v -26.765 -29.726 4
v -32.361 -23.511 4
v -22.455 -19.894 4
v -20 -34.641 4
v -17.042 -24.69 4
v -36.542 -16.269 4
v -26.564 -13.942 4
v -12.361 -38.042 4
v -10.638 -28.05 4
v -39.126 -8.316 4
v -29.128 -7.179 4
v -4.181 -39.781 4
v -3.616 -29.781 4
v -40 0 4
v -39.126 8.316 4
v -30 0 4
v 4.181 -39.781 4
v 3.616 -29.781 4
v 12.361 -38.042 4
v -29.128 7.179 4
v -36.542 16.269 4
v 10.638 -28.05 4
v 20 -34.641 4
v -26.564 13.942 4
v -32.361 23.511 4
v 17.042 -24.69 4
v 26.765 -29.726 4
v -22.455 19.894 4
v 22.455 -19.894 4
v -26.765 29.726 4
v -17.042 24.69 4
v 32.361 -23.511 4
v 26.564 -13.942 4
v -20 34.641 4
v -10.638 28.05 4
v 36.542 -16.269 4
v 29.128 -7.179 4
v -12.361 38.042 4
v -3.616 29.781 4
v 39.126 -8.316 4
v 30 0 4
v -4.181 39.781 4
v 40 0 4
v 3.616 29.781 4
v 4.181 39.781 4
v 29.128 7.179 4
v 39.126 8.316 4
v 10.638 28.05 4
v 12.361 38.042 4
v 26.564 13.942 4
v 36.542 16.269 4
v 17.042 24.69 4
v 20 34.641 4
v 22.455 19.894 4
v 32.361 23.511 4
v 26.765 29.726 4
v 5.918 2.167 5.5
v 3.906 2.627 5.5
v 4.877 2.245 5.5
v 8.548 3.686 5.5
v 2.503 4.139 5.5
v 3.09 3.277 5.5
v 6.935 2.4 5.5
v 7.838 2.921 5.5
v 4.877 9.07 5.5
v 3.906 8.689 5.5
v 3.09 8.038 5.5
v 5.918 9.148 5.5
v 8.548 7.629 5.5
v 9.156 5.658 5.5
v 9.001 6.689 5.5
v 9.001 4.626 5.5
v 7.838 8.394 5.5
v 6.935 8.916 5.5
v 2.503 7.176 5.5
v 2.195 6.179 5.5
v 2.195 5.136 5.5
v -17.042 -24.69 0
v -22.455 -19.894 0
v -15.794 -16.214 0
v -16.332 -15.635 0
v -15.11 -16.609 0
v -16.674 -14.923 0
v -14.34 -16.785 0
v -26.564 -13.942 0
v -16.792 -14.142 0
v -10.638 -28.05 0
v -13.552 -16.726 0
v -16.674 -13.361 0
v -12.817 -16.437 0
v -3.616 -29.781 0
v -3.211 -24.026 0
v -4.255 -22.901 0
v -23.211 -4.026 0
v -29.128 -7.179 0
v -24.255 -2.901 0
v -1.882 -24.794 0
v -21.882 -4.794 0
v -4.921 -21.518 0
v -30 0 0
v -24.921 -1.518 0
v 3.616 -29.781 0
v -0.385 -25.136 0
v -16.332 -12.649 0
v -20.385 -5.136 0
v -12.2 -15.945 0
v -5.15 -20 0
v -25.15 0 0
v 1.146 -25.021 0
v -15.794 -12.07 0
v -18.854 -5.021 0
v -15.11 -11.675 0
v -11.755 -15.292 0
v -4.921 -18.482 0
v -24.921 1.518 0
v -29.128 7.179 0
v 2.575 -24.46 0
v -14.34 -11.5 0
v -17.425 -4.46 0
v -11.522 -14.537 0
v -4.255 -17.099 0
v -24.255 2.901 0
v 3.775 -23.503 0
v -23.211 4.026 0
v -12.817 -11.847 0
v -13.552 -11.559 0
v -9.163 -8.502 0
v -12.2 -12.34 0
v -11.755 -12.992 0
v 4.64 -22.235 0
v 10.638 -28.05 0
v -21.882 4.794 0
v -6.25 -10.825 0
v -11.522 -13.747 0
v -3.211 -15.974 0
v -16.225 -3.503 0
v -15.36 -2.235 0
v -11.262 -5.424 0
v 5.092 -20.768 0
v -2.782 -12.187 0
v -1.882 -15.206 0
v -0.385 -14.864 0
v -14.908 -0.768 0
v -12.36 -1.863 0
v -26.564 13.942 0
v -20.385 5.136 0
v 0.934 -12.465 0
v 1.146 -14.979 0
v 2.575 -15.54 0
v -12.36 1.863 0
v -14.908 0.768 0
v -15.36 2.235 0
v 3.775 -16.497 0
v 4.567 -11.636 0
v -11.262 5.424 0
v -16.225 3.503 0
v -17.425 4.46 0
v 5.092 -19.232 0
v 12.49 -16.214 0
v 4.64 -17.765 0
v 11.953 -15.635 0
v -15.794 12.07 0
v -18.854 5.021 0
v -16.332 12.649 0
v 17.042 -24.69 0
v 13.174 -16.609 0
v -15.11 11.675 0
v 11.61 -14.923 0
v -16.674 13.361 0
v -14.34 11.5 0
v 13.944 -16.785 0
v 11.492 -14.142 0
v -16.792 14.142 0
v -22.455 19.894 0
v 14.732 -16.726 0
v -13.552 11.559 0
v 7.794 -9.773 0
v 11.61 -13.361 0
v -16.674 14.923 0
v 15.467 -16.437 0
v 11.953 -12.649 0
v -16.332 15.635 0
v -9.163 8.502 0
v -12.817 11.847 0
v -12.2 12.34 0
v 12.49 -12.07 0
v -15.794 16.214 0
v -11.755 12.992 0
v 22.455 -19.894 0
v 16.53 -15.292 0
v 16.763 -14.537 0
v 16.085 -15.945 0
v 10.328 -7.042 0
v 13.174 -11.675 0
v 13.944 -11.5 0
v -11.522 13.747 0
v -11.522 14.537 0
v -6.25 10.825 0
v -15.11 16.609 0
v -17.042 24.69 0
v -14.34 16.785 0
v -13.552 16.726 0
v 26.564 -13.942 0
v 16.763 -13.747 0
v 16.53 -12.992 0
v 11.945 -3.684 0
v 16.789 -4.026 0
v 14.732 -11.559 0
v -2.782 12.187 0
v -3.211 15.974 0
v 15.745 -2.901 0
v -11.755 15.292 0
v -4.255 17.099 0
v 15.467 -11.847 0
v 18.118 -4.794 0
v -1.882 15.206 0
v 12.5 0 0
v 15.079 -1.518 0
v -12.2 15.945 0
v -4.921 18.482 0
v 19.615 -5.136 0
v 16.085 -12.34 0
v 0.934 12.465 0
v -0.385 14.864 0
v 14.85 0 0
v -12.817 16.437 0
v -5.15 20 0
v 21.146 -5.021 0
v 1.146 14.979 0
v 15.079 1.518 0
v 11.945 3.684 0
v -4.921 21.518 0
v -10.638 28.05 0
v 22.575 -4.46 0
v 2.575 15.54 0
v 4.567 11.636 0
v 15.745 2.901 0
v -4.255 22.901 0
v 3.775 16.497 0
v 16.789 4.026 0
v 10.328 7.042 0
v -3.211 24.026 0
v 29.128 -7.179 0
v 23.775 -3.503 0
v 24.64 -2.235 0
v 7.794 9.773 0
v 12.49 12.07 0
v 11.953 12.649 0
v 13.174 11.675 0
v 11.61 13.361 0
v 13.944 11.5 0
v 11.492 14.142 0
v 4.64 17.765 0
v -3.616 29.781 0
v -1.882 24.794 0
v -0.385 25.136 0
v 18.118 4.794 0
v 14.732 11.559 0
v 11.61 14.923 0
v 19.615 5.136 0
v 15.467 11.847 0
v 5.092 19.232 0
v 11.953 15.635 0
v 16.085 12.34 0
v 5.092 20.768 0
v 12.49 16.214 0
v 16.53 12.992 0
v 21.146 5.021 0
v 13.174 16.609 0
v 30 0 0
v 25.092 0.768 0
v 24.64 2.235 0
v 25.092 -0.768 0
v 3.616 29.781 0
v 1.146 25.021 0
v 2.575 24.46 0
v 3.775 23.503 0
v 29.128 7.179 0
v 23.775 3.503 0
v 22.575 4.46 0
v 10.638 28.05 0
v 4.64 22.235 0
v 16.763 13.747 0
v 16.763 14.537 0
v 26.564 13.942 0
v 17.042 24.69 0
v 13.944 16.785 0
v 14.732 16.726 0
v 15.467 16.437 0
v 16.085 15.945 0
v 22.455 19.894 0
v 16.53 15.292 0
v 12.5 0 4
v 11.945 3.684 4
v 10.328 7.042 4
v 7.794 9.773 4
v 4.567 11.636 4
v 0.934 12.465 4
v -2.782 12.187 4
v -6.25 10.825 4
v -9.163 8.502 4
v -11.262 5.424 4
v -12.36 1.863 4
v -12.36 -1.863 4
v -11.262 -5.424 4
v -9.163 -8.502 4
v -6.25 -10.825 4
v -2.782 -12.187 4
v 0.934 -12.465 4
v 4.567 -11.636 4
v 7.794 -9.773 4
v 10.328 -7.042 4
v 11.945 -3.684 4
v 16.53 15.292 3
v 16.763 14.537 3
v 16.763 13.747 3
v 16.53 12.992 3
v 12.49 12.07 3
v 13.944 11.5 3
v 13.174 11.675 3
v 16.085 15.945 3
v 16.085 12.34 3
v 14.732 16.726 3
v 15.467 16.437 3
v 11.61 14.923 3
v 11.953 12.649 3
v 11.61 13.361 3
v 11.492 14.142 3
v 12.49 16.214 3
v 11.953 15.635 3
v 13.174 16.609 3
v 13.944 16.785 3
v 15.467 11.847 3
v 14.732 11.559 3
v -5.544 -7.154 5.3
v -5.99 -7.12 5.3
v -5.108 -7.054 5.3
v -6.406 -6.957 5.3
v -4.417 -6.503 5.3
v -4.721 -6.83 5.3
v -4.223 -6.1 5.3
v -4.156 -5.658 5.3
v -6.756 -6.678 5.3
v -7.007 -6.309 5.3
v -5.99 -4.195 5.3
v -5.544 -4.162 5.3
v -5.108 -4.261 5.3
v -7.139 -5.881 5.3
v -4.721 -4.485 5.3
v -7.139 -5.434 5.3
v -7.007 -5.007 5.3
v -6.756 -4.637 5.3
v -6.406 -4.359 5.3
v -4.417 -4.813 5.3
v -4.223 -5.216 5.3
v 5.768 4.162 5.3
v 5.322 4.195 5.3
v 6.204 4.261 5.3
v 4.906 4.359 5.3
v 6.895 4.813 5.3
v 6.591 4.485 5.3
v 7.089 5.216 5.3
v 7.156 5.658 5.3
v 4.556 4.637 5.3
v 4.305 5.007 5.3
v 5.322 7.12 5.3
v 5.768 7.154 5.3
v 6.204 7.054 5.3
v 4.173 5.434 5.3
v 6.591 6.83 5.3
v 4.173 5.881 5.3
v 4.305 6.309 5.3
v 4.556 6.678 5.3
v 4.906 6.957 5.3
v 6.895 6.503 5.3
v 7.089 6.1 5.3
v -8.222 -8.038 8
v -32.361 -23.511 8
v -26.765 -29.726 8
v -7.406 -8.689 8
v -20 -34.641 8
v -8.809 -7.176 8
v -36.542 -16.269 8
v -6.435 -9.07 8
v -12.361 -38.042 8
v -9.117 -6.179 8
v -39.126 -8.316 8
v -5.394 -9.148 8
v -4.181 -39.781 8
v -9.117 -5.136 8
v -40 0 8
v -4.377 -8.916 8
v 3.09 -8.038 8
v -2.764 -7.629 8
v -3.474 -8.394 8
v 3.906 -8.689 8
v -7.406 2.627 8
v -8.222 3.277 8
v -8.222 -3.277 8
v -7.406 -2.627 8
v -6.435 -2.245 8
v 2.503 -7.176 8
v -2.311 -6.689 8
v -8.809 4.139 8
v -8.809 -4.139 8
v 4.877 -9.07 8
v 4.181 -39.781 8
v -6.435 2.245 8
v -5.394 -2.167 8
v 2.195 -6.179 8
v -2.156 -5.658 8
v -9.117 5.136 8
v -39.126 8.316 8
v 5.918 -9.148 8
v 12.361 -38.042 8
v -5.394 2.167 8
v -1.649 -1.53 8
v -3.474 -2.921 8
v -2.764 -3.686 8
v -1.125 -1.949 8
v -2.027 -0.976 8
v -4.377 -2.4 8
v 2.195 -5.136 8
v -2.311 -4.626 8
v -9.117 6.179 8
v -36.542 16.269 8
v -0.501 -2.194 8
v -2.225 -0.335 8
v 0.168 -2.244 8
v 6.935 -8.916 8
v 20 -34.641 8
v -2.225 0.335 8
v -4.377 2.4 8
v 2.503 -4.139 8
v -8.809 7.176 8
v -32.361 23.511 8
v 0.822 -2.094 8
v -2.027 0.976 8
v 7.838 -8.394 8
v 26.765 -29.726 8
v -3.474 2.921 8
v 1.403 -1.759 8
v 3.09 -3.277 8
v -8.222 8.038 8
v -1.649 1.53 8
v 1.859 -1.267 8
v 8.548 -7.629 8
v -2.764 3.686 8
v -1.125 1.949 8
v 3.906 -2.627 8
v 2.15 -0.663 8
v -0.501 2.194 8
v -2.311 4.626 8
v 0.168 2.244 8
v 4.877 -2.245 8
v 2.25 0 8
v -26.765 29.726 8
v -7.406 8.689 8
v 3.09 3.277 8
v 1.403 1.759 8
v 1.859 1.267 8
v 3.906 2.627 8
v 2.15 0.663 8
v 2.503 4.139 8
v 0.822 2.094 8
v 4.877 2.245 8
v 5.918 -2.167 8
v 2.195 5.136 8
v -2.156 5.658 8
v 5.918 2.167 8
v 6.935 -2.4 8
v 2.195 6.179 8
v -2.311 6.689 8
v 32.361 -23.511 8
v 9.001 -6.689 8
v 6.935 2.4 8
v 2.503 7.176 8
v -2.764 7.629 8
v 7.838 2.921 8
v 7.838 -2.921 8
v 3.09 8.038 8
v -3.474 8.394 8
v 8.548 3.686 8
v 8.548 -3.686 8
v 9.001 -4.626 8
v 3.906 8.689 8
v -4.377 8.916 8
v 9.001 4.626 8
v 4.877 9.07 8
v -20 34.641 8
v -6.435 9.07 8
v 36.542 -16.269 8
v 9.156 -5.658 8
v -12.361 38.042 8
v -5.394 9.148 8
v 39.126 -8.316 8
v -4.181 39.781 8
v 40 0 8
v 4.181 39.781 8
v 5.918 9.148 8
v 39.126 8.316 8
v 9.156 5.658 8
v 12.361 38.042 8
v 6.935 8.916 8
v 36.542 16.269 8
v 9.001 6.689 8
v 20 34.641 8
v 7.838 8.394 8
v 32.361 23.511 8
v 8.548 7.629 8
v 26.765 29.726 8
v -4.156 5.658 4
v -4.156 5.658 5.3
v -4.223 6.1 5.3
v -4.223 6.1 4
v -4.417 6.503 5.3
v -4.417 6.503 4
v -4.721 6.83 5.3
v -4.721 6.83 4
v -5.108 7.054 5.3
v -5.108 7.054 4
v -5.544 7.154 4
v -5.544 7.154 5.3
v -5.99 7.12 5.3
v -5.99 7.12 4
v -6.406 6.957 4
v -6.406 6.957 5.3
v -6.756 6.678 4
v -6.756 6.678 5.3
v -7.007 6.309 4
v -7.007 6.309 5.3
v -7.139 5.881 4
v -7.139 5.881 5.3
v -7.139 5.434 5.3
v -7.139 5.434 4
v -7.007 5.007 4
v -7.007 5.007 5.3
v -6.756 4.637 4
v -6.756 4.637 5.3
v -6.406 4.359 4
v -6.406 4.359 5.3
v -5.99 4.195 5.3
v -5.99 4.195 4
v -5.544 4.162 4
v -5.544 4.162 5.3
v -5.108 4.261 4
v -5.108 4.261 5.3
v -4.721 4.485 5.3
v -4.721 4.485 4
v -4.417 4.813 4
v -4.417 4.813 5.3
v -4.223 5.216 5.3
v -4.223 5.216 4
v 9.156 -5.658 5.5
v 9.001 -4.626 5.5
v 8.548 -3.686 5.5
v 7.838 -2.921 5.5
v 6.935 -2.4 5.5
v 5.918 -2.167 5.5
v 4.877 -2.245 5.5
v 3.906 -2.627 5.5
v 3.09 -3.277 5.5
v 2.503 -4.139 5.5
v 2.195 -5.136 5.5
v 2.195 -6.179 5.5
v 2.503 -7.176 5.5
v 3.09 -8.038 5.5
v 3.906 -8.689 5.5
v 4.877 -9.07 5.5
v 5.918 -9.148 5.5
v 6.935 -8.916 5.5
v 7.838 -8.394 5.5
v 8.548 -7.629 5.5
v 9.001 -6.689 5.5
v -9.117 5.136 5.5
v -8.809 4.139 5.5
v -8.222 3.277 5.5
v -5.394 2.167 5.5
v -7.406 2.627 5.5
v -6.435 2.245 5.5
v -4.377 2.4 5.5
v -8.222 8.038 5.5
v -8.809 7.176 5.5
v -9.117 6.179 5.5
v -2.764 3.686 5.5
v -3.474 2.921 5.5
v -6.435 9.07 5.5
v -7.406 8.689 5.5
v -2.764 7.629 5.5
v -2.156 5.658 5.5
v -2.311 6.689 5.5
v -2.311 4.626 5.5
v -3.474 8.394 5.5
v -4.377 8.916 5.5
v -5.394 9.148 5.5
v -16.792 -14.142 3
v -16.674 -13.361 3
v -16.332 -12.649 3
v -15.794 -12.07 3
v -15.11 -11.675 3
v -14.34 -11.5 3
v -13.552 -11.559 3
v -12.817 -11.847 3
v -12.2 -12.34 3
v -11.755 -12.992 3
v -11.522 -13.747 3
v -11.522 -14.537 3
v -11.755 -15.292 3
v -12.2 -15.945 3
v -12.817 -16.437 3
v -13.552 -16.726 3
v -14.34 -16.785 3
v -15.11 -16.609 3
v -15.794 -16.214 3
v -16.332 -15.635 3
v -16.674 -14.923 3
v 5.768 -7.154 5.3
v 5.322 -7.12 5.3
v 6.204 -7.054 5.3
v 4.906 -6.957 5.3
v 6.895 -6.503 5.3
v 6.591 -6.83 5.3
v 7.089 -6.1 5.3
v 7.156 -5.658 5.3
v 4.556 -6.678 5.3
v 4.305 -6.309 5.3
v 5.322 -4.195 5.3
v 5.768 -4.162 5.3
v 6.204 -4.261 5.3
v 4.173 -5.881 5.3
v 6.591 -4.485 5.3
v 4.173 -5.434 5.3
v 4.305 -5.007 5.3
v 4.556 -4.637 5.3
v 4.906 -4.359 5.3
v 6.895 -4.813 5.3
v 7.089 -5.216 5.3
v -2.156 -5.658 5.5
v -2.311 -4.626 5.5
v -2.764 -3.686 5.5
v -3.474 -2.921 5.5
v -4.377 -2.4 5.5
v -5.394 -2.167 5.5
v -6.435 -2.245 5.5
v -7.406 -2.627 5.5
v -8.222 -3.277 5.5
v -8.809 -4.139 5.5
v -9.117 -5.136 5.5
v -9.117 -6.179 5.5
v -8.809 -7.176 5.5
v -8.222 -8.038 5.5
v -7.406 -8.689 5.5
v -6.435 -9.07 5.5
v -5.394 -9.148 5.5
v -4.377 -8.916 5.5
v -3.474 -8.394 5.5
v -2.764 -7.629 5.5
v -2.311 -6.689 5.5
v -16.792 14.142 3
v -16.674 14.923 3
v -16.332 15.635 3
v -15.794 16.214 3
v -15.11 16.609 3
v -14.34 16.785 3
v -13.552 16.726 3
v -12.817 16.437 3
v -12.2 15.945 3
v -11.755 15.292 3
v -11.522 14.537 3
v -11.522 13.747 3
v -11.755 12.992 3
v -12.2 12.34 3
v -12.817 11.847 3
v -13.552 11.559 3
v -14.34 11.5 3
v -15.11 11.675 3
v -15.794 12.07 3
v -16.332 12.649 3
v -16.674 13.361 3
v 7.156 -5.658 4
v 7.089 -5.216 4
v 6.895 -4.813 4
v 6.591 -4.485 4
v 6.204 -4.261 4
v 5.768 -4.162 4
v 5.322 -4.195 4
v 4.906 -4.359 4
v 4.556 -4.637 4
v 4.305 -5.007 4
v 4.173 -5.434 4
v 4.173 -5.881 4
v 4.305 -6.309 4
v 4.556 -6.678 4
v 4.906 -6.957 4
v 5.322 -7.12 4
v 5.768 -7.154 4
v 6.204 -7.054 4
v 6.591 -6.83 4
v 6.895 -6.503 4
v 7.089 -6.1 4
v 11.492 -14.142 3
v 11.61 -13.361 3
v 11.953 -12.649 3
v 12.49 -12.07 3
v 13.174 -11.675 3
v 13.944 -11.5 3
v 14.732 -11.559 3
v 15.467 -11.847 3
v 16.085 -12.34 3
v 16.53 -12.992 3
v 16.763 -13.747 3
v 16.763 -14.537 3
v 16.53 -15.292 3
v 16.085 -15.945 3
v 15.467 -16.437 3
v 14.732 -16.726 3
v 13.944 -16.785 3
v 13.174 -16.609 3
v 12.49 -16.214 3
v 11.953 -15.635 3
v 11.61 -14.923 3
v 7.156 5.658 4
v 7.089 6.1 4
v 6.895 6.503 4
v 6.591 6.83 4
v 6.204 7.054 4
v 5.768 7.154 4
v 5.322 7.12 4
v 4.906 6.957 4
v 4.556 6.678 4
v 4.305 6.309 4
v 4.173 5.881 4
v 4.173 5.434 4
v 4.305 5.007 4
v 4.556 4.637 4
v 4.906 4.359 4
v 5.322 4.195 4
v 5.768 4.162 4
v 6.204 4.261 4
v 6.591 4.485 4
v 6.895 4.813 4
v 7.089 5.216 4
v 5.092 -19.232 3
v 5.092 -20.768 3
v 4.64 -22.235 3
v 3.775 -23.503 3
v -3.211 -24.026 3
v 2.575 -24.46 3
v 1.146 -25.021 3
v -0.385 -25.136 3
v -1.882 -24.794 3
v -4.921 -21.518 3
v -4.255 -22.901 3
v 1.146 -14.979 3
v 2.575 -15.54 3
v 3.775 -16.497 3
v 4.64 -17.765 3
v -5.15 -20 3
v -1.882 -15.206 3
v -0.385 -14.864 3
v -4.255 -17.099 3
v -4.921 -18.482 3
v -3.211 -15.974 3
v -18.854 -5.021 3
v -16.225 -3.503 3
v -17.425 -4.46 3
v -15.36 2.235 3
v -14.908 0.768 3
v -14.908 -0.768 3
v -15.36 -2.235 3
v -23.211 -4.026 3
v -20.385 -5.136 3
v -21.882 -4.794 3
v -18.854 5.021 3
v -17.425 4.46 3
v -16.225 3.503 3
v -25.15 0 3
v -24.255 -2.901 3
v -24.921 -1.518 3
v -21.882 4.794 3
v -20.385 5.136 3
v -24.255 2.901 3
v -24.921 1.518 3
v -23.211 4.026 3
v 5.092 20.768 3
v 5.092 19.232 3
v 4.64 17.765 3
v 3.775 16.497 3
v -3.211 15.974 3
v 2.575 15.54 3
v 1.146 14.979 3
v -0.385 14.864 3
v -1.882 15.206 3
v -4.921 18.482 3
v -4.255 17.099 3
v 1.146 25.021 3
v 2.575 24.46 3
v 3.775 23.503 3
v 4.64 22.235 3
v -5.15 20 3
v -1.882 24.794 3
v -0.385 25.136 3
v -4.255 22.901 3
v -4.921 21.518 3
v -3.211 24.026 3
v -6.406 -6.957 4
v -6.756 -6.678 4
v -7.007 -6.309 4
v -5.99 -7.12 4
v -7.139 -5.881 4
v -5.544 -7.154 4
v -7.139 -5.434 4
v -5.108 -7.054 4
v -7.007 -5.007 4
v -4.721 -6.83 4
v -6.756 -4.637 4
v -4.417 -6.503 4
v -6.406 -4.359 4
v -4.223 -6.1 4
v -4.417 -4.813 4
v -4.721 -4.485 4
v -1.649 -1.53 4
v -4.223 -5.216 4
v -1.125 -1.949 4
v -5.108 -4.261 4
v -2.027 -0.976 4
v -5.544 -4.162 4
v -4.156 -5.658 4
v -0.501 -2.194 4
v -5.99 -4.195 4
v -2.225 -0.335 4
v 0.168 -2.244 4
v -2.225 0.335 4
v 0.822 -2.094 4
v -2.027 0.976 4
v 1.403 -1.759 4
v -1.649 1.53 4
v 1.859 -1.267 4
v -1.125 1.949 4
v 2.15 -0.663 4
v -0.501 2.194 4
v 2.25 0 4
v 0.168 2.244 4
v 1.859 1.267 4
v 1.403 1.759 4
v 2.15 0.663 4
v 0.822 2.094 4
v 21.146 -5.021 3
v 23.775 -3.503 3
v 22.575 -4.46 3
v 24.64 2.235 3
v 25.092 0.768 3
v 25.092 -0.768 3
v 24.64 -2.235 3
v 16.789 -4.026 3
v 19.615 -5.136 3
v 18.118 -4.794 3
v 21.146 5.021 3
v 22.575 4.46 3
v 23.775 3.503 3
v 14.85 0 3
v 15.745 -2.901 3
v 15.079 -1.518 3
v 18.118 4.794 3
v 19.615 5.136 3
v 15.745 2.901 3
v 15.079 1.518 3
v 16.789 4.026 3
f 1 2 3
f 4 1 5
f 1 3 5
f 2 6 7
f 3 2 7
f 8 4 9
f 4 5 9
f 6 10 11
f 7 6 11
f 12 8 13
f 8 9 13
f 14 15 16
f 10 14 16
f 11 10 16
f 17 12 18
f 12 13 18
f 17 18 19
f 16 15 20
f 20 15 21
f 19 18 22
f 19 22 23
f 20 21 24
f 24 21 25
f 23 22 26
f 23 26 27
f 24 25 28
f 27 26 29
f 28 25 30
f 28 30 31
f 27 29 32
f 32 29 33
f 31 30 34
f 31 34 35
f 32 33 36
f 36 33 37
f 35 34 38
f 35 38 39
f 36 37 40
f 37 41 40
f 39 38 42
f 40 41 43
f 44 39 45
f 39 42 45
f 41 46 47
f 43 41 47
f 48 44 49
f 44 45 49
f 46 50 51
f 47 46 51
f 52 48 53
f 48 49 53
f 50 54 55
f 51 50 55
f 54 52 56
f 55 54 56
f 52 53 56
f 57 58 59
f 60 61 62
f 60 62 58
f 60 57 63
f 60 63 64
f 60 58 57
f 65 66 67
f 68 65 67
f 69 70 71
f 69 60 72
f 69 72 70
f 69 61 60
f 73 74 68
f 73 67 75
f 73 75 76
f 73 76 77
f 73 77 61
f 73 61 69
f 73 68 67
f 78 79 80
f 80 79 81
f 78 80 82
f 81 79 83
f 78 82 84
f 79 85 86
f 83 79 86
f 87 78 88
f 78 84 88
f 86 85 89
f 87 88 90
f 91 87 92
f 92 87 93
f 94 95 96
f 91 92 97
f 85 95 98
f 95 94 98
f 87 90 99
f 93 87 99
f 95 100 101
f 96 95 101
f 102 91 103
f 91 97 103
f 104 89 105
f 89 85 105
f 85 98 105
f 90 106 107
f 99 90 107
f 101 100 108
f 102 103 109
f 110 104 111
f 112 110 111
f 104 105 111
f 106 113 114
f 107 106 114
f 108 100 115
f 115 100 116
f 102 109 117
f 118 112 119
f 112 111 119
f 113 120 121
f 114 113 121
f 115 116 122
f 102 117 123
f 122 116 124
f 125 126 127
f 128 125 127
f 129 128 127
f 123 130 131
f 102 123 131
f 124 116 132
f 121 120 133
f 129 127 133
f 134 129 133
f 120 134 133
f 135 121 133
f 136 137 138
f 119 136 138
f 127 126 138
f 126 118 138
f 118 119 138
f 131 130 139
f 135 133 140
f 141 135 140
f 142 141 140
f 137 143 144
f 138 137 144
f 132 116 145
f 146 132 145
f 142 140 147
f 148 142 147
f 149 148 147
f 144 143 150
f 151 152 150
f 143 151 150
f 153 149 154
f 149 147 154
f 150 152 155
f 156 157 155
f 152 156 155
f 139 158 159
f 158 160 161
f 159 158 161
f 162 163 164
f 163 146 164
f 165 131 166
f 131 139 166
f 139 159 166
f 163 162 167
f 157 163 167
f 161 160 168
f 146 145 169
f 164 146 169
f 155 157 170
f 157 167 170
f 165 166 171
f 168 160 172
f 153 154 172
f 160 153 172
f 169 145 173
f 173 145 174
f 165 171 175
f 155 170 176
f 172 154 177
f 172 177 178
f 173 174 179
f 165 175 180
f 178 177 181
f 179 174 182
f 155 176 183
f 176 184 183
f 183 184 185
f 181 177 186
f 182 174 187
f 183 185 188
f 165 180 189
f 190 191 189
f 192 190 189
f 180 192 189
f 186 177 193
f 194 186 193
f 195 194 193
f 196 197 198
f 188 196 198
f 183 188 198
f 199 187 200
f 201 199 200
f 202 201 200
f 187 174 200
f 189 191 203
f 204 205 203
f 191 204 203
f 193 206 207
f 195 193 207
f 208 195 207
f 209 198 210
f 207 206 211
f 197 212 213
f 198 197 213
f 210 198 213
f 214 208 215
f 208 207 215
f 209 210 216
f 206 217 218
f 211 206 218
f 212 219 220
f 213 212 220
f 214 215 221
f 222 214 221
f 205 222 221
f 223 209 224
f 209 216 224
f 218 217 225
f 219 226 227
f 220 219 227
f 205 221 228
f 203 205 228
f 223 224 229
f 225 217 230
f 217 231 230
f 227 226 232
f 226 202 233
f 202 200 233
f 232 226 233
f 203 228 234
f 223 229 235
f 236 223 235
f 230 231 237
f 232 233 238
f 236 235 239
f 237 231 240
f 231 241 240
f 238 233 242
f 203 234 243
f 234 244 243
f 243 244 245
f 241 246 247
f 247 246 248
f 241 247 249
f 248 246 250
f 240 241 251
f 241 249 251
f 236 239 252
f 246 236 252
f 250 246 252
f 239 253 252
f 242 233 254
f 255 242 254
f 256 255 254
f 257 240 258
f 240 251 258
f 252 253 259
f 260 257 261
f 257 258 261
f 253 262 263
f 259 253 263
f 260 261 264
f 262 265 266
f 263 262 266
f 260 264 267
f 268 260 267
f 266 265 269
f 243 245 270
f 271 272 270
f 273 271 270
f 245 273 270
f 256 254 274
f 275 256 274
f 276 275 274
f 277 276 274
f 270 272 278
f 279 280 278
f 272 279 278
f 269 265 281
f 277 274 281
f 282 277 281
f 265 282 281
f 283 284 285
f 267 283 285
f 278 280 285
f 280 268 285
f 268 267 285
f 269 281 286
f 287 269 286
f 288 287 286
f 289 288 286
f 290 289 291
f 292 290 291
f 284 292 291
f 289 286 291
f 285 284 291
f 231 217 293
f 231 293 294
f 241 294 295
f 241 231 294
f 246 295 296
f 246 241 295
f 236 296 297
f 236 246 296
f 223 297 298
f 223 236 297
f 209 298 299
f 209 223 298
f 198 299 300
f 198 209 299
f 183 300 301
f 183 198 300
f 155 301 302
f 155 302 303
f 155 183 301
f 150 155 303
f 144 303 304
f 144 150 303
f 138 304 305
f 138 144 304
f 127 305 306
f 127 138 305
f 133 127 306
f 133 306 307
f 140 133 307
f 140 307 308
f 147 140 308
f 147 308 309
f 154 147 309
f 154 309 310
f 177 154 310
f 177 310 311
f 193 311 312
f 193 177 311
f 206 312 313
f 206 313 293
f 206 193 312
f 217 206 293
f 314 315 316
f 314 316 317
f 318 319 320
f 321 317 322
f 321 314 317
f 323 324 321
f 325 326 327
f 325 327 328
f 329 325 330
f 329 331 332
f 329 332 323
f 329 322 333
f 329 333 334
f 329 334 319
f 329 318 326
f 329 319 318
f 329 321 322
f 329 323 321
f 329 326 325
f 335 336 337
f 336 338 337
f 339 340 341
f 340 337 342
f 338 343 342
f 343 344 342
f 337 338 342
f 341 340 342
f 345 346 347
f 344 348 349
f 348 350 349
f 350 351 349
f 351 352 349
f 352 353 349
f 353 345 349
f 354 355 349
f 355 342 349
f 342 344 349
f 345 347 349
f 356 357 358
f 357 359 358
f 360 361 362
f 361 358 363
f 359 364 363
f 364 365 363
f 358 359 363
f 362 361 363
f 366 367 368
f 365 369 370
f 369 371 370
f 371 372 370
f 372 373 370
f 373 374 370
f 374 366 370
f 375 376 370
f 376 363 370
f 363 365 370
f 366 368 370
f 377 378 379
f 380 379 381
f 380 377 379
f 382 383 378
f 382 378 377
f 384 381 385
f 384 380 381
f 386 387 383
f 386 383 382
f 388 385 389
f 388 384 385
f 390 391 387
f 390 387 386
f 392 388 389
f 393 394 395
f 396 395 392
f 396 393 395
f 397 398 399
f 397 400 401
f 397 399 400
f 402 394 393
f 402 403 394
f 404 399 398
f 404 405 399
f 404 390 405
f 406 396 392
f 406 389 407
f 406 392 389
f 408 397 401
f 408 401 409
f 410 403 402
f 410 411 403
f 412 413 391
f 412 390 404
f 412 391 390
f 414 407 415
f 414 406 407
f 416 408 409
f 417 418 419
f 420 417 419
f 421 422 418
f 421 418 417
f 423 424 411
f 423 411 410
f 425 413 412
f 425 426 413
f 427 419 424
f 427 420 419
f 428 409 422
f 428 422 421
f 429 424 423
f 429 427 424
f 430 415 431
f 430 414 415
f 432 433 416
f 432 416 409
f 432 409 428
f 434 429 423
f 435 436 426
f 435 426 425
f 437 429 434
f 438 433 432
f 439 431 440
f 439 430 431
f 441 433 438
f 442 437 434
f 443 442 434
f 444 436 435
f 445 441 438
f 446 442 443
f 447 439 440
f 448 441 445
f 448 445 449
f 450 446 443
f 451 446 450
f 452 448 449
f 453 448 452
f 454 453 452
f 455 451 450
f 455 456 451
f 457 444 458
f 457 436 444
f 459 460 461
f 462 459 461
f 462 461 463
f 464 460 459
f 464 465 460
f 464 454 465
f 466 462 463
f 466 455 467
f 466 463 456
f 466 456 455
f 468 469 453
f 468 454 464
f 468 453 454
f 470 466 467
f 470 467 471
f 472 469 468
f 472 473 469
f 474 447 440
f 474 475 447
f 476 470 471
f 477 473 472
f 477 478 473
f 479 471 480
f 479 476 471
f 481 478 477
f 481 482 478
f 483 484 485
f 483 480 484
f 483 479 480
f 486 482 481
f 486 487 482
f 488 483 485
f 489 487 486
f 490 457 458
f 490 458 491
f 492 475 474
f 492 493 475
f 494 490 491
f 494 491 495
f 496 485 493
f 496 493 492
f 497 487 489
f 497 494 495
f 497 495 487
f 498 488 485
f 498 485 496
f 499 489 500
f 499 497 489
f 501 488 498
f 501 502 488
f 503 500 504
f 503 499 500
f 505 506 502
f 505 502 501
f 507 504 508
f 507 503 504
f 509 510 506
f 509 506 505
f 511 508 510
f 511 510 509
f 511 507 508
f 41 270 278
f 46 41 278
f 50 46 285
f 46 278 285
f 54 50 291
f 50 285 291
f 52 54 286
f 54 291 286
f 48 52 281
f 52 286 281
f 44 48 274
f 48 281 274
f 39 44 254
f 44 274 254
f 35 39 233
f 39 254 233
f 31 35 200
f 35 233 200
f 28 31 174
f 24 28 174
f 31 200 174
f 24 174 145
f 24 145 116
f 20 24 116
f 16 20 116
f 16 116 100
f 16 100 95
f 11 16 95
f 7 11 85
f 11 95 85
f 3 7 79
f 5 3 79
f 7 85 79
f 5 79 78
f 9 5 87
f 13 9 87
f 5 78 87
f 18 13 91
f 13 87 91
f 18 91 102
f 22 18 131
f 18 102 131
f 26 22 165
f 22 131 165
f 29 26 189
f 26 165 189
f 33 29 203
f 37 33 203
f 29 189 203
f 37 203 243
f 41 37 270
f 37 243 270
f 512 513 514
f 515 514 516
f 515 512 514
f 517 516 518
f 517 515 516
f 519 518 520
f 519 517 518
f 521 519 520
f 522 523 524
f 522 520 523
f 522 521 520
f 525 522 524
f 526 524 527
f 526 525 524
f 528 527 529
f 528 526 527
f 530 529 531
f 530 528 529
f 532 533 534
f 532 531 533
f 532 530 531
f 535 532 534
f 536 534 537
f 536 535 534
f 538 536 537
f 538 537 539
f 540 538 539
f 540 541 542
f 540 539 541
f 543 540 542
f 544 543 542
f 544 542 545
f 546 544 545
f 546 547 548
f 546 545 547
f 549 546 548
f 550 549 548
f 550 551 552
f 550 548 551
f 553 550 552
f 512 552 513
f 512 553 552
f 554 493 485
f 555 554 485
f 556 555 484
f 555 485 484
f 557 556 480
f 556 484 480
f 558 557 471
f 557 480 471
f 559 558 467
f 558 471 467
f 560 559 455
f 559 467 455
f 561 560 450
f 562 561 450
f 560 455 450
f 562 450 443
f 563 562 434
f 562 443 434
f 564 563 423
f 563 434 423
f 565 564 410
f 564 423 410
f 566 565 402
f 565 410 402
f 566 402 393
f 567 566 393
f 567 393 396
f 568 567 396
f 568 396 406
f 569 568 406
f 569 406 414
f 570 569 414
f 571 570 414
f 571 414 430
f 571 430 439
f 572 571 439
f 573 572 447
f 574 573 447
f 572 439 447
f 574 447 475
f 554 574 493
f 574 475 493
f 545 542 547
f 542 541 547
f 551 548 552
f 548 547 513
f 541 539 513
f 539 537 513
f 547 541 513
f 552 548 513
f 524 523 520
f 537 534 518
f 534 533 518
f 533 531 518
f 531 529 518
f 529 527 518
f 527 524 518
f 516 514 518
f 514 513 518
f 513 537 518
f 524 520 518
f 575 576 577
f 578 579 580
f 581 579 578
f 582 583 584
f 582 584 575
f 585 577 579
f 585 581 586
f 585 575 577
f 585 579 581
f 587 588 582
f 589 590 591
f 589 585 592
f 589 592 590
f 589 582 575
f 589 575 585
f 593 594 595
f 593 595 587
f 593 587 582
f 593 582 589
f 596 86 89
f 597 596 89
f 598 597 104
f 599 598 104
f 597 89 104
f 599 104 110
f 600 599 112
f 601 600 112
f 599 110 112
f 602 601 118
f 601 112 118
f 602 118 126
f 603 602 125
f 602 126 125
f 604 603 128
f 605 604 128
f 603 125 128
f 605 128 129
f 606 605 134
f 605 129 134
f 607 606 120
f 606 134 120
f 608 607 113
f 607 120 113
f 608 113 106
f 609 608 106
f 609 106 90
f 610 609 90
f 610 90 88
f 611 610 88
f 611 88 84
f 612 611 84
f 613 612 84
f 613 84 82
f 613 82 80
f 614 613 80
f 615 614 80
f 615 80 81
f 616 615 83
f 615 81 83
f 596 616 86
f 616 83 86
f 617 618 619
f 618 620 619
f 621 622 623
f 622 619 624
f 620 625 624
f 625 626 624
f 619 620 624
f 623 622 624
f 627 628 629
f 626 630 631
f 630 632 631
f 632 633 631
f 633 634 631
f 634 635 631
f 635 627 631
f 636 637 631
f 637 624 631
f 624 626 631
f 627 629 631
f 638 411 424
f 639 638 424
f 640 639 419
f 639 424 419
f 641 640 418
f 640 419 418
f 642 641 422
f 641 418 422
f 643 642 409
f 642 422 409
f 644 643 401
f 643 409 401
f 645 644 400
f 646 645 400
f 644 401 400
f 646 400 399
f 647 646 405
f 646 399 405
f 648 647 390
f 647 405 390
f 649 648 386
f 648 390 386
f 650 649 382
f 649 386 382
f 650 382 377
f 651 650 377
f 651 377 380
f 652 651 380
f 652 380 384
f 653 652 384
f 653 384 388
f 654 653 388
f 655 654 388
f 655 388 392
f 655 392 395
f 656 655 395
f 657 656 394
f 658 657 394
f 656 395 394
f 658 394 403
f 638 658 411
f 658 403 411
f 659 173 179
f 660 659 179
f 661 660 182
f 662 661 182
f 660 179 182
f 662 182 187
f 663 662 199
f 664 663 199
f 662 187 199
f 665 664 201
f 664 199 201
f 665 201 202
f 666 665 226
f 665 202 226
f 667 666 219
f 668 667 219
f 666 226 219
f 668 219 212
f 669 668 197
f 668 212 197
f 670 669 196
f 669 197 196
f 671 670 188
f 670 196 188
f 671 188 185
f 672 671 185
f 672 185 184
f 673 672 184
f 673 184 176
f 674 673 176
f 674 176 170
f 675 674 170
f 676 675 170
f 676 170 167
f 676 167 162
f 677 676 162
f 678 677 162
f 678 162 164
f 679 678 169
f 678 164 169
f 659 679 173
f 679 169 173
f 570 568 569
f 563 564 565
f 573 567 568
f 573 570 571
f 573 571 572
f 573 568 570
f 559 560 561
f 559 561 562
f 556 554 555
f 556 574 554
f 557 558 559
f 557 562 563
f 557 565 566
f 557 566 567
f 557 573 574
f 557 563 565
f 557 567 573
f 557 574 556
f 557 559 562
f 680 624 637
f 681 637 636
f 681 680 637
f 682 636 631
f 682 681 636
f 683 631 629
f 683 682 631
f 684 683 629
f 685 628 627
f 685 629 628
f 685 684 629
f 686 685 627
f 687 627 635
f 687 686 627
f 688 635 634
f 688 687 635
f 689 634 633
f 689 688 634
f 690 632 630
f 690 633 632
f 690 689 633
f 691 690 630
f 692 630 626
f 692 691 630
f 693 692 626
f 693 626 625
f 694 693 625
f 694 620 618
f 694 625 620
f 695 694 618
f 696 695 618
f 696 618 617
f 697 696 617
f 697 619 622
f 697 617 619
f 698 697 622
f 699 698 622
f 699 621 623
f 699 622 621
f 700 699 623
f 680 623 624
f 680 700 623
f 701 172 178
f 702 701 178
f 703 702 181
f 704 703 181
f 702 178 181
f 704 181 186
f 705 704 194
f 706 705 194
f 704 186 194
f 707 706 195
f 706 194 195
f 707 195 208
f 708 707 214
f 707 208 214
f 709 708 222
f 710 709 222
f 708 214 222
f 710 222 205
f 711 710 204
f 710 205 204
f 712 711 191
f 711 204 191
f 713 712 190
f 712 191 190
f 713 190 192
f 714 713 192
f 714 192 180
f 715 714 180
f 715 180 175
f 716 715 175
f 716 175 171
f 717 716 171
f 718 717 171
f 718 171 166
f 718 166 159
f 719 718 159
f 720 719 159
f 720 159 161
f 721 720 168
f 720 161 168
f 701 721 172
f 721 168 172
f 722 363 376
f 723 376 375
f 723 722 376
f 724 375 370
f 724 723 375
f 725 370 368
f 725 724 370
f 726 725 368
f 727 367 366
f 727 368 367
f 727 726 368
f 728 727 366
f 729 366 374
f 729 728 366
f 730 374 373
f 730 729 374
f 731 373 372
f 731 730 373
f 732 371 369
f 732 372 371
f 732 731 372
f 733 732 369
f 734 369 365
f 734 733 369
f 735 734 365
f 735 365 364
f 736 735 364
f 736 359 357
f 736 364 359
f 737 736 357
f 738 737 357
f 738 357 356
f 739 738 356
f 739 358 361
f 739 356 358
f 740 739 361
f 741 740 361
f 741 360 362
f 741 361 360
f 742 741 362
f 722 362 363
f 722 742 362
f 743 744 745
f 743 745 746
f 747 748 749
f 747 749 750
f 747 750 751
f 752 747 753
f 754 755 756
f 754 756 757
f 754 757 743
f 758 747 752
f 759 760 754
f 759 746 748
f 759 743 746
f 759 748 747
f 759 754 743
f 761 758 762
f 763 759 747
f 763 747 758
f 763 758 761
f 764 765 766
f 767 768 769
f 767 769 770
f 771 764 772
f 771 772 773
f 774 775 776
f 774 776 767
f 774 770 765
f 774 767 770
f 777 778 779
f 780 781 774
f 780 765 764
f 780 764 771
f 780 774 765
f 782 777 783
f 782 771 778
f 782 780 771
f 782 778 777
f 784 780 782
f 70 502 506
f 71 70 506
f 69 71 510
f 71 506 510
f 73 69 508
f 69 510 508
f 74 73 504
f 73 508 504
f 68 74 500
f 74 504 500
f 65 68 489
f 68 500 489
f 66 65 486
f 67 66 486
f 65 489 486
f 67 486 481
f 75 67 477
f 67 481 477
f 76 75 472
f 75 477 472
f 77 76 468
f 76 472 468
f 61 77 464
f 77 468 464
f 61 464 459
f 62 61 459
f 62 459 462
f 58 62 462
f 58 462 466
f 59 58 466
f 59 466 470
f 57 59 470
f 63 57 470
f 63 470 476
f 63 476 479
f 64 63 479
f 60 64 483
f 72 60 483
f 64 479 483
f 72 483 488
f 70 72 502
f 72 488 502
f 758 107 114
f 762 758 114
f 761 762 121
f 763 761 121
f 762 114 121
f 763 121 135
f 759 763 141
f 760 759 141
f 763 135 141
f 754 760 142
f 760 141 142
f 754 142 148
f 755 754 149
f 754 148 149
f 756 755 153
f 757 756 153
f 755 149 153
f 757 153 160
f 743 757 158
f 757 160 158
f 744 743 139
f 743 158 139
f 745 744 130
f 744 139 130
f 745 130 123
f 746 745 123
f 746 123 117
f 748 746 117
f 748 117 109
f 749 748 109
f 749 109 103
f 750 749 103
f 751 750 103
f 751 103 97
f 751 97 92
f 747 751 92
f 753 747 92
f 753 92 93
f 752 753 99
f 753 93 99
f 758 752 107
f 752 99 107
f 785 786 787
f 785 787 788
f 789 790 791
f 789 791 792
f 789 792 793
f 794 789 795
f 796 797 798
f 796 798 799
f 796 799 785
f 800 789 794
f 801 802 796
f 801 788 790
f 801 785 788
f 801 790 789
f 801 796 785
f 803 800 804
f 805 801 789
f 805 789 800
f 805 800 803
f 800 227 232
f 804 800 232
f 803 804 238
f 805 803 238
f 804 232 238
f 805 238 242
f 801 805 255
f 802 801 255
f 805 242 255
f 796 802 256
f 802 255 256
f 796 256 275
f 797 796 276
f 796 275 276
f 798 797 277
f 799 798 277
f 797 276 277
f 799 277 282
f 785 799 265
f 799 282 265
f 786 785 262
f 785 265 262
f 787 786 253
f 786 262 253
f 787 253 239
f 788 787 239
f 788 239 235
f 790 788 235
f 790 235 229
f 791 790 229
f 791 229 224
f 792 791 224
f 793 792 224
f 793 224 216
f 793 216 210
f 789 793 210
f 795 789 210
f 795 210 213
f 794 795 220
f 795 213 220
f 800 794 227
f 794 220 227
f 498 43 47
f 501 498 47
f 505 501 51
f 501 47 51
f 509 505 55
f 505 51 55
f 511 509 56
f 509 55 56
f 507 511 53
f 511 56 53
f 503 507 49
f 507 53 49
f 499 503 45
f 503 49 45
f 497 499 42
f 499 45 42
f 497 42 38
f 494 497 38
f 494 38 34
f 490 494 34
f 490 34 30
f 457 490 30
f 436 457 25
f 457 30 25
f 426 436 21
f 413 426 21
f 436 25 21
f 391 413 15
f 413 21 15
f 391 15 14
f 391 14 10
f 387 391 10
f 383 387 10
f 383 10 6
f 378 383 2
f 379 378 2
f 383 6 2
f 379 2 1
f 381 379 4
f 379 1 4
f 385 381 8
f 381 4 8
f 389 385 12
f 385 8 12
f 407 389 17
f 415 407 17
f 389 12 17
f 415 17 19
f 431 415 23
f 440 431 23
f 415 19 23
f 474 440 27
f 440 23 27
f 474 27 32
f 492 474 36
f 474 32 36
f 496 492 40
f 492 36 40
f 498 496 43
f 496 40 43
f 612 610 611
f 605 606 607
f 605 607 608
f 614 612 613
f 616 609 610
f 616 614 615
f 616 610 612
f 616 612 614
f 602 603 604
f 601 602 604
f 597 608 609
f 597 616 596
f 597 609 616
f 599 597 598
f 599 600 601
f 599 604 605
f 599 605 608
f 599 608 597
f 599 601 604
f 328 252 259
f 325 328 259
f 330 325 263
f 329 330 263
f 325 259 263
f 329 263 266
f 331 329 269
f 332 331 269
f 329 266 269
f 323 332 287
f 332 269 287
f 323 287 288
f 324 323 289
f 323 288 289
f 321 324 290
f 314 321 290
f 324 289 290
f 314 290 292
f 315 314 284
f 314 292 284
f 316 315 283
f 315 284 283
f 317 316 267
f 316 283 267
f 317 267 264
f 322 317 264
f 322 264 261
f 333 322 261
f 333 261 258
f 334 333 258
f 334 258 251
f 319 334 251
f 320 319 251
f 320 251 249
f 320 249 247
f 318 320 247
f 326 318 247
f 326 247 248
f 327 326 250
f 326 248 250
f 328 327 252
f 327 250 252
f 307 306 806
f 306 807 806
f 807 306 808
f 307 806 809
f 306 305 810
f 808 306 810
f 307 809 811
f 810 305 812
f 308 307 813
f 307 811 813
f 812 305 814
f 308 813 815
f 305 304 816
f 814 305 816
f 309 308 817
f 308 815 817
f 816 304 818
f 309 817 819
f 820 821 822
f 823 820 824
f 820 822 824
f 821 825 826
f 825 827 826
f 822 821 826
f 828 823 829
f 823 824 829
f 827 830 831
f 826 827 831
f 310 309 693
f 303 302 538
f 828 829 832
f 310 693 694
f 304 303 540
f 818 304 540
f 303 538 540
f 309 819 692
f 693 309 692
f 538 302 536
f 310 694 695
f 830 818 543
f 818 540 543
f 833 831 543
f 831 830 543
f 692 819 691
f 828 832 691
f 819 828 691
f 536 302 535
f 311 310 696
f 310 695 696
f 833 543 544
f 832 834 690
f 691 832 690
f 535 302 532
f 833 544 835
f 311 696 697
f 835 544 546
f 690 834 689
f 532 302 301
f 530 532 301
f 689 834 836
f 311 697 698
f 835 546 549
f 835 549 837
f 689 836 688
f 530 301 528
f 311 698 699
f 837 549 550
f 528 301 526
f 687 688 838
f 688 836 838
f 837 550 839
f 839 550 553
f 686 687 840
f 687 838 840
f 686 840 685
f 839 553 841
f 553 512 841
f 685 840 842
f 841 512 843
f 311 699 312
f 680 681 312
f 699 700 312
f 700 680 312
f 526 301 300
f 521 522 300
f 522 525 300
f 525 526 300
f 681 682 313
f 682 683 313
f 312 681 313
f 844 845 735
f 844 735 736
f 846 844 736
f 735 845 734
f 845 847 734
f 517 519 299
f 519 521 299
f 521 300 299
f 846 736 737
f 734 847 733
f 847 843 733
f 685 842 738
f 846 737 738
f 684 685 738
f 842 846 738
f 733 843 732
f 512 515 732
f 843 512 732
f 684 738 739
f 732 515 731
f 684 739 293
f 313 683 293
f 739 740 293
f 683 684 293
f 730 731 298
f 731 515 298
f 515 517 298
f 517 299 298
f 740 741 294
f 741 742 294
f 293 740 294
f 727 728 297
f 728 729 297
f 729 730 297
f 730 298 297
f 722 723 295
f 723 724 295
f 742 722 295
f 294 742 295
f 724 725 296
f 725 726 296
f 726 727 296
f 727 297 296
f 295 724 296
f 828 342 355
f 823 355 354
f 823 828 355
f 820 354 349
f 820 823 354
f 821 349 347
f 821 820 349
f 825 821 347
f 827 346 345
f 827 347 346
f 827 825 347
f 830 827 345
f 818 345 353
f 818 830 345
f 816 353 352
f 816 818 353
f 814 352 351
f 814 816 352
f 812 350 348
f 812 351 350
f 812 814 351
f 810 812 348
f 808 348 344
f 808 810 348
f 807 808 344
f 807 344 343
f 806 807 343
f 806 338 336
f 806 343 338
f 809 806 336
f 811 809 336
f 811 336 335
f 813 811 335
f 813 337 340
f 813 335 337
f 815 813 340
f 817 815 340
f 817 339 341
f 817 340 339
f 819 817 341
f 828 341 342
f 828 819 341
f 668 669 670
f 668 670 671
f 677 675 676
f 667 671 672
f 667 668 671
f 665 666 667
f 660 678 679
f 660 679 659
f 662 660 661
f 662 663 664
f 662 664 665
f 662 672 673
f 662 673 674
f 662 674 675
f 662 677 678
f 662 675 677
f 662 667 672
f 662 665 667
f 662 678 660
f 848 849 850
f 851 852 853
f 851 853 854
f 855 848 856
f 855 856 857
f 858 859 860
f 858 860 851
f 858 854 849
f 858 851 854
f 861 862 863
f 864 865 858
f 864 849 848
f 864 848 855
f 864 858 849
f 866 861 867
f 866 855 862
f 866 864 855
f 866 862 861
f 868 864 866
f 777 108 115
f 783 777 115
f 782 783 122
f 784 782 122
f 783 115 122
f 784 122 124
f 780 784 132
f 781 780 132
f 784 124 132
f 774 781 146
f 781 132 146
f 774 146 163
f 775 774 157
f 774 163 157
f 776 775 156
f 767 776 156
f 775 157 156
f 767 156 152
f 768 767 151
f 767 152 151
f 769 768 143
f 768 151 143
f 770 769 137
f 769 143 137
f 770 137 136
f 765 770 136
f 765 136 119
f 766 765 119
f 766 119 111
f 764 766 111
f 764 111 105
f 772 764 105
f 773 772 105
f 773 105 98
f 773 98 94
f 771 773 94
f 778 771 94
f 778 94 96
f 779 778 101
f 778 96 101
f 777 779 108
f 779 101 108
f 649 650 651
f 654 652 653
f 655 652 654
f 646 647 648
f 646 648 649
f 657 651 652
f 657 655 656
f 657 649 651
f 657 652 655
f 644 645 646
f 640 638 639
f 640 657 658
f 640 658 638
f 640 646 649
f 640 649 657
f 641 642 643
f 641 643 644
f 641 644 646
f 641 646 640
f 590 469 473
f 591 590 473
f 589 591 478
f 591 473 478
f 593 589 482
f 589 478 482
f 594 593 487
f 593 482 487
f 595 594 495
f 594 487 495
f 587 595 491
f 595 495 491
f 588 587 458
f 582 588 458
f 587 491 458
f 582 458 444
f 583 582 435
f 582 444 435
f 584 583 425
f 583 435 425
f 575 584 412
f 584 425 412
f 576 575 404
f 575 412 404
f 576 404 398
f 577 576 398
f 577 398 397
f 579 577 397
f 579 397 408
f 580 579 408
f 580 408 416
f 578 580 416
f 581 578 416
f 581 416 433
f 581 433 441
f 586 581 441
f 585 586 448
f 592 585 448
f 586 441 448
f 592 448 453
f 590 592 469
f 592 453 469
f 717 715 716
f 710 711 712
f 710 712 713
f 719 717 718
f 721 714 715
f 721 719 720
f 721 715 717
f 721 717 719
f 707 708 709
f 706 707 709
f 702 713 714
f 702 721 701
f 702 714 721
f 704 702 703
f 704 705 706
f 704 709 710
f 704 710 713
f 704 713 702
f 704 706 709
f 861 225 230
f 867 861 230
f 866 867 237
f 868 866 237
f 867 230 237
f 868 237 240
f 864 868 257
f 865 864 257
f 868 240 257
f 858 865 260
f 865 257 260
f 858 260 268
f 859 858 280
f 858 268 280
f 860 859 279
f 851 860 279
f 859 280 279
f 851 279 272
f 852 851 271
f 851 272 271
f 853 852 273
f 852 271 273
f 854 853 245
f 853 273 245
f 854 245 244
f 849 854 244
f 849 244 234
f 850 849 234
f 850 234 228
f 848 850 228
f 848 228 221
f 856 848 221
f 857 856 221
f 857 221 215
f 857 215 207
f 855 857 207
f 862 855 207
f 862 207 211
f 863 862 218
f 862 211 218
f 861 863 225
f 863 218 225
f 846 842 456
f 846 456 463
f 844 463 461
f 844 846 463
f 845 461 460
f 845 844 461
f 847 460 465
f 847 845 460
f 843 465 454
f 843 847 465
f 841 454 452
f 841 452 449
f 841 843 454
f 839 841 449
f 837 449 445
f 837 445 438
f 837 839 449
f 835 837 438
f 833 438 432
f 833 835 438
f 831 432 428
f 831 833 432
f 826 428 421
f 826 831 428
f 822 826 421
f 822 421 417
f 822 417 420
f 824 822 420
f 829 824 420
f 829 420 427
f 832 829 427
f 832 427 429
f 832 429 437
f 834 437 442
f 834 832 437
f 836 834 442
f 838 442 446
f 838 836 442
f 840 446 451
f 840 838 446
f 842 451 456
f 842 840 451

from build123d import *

# Parameters (mm, degrees)
SKETCH1_R           = 30
SKETCH1_R_2         = 12.5
BOSS_EXTRUDE1_DEPTH = 4
SKETCH2_R           = 40
SKETCH2_R_2         = 2.25
SKETCH2_R_3         = 1.5
BOSS_EXTRUDE2_DEPTH = 4
SKETCH3_R           = 3.5
CUT_EXTRUDE1_DEPTH  = 2.5
SKETCH4_R           = 5.15
SKETCH4_R_2         = 2.65
CUT_EXTRUDE2_DEPTH  = 3
SKETCH5_R           = 3.5
BOSS_EXTRUDE3_DEPTH = 0.2


with BuildPart() as part:
    # Sketch1 → Boss-Extrude1 (new body)
    with BuildSketch(Plane.XY):
        Circle(SKETCH1_R)
        Circle(SKETCH1_R_2, mode=Mode.SUBTRACT)
    extrude(amount=BOSS_EXTRUDE1_DEPTH)

    # Sketch2 → Boss-Extrude2 (add)
    with BuildSketch(Plane.XY.offset(4)):
        Circle(SKETCH2_R)
        Circle(SKETCH2_R_2, mode=Mode.SUBTRACT)
        with Locations((-5.655999742, 5.657708628)):
            Circle(SKETCH2_R_3, mode=Mode.SUBTRACT)
        with Locations((-5.655999742, -5.657708628)):
            Circle(SKETCH2_R_3, mode=Mode.SUBTRACT)
        with Locations((5.655999742, -5.657708628)):
            Circle(SKETCH2_R_3, mode=Mode.SUBTRACT)
        with Locations((5.655999742, 5.657708628)):
            Circle(SKETCH2_R_3, mode=Mode.SUBTRACT)
    extrude(amount=BOSS_EXTRUDE2_DEPTH)

    # Sketch3 → Cut-Extrude1 (cut)
    with BuildSketch(Plane.XY.offset(8)):
        with Locations((-5.655999742, 5.657708628)):
            Circle(SKETCH3_R)
        with Locations((5.655999742, 5.657708628)):
            Circle(SKETCH3_R)
        with Locations((5.655999742, -5.657708628)):
            Circle(SKETCH3_R)
        with Locations((-5.655999742, -5.657708628)):
            Circle(SKETCH3_R)
    extrude(amount=-CUT_EXTRUDE1_DEPTH, mode=Mode.SUBTRACT)

    # Sketch4 → Cut-Extrude2 (cut)
    with BuildSketch(Plane(origin=(0, 0, 0), x_dir=(-1, 0, 0), z_dir=(0, 0, -1))):
        with Locations((-20, 0)):
            Circle(SKETCH4_R)
        with Locations((0, -20)):
            Circle(SKETCH4_R)
        with Locations((20, 0)):
            Circle(SKETCH4_R)
        with Locations((0, 20)):
            Circle(SKETCH4_R)
        with Locations((14.142135624, 14.142135624)):
            Circle(SKETCH4_R_2)
        with Locations((14.142135624, -14.142135624)):
            Circle(SKETCH4_R_2)
        with Locations((-14.142135624, -14.142135624)):
            Circle(SKETCH4_R_2)
        with Locations((-14.142135624, 14.142135624)):
            Circle(SKETCH4_R_2)
    extrude(amount=-CUT_EXTRUDE2_DEPTH, mode=Mode.SUBTRACT)

    # Sketch5 → Boss-Extrude3 (add)
    with BuildSketch(Plane.XY.offset(5.5)):
        with Locations((-5.655999742, 5.657708628)):
            Circle(SKETCH5_R)
        with Locations((5.655999742, 5.657708628)):
            Circle(SKETCH5_R)
        with Locations((-5.655999742, -5.657708628)):
            Circle(SKETCH5_R)
        with Locations((5.655999742, -5.657708628)):
            Circle(SKETCH5_R)
    extrude(amount=-BOSS_EXTRUDE3_DEPTH)


solid = part.part
